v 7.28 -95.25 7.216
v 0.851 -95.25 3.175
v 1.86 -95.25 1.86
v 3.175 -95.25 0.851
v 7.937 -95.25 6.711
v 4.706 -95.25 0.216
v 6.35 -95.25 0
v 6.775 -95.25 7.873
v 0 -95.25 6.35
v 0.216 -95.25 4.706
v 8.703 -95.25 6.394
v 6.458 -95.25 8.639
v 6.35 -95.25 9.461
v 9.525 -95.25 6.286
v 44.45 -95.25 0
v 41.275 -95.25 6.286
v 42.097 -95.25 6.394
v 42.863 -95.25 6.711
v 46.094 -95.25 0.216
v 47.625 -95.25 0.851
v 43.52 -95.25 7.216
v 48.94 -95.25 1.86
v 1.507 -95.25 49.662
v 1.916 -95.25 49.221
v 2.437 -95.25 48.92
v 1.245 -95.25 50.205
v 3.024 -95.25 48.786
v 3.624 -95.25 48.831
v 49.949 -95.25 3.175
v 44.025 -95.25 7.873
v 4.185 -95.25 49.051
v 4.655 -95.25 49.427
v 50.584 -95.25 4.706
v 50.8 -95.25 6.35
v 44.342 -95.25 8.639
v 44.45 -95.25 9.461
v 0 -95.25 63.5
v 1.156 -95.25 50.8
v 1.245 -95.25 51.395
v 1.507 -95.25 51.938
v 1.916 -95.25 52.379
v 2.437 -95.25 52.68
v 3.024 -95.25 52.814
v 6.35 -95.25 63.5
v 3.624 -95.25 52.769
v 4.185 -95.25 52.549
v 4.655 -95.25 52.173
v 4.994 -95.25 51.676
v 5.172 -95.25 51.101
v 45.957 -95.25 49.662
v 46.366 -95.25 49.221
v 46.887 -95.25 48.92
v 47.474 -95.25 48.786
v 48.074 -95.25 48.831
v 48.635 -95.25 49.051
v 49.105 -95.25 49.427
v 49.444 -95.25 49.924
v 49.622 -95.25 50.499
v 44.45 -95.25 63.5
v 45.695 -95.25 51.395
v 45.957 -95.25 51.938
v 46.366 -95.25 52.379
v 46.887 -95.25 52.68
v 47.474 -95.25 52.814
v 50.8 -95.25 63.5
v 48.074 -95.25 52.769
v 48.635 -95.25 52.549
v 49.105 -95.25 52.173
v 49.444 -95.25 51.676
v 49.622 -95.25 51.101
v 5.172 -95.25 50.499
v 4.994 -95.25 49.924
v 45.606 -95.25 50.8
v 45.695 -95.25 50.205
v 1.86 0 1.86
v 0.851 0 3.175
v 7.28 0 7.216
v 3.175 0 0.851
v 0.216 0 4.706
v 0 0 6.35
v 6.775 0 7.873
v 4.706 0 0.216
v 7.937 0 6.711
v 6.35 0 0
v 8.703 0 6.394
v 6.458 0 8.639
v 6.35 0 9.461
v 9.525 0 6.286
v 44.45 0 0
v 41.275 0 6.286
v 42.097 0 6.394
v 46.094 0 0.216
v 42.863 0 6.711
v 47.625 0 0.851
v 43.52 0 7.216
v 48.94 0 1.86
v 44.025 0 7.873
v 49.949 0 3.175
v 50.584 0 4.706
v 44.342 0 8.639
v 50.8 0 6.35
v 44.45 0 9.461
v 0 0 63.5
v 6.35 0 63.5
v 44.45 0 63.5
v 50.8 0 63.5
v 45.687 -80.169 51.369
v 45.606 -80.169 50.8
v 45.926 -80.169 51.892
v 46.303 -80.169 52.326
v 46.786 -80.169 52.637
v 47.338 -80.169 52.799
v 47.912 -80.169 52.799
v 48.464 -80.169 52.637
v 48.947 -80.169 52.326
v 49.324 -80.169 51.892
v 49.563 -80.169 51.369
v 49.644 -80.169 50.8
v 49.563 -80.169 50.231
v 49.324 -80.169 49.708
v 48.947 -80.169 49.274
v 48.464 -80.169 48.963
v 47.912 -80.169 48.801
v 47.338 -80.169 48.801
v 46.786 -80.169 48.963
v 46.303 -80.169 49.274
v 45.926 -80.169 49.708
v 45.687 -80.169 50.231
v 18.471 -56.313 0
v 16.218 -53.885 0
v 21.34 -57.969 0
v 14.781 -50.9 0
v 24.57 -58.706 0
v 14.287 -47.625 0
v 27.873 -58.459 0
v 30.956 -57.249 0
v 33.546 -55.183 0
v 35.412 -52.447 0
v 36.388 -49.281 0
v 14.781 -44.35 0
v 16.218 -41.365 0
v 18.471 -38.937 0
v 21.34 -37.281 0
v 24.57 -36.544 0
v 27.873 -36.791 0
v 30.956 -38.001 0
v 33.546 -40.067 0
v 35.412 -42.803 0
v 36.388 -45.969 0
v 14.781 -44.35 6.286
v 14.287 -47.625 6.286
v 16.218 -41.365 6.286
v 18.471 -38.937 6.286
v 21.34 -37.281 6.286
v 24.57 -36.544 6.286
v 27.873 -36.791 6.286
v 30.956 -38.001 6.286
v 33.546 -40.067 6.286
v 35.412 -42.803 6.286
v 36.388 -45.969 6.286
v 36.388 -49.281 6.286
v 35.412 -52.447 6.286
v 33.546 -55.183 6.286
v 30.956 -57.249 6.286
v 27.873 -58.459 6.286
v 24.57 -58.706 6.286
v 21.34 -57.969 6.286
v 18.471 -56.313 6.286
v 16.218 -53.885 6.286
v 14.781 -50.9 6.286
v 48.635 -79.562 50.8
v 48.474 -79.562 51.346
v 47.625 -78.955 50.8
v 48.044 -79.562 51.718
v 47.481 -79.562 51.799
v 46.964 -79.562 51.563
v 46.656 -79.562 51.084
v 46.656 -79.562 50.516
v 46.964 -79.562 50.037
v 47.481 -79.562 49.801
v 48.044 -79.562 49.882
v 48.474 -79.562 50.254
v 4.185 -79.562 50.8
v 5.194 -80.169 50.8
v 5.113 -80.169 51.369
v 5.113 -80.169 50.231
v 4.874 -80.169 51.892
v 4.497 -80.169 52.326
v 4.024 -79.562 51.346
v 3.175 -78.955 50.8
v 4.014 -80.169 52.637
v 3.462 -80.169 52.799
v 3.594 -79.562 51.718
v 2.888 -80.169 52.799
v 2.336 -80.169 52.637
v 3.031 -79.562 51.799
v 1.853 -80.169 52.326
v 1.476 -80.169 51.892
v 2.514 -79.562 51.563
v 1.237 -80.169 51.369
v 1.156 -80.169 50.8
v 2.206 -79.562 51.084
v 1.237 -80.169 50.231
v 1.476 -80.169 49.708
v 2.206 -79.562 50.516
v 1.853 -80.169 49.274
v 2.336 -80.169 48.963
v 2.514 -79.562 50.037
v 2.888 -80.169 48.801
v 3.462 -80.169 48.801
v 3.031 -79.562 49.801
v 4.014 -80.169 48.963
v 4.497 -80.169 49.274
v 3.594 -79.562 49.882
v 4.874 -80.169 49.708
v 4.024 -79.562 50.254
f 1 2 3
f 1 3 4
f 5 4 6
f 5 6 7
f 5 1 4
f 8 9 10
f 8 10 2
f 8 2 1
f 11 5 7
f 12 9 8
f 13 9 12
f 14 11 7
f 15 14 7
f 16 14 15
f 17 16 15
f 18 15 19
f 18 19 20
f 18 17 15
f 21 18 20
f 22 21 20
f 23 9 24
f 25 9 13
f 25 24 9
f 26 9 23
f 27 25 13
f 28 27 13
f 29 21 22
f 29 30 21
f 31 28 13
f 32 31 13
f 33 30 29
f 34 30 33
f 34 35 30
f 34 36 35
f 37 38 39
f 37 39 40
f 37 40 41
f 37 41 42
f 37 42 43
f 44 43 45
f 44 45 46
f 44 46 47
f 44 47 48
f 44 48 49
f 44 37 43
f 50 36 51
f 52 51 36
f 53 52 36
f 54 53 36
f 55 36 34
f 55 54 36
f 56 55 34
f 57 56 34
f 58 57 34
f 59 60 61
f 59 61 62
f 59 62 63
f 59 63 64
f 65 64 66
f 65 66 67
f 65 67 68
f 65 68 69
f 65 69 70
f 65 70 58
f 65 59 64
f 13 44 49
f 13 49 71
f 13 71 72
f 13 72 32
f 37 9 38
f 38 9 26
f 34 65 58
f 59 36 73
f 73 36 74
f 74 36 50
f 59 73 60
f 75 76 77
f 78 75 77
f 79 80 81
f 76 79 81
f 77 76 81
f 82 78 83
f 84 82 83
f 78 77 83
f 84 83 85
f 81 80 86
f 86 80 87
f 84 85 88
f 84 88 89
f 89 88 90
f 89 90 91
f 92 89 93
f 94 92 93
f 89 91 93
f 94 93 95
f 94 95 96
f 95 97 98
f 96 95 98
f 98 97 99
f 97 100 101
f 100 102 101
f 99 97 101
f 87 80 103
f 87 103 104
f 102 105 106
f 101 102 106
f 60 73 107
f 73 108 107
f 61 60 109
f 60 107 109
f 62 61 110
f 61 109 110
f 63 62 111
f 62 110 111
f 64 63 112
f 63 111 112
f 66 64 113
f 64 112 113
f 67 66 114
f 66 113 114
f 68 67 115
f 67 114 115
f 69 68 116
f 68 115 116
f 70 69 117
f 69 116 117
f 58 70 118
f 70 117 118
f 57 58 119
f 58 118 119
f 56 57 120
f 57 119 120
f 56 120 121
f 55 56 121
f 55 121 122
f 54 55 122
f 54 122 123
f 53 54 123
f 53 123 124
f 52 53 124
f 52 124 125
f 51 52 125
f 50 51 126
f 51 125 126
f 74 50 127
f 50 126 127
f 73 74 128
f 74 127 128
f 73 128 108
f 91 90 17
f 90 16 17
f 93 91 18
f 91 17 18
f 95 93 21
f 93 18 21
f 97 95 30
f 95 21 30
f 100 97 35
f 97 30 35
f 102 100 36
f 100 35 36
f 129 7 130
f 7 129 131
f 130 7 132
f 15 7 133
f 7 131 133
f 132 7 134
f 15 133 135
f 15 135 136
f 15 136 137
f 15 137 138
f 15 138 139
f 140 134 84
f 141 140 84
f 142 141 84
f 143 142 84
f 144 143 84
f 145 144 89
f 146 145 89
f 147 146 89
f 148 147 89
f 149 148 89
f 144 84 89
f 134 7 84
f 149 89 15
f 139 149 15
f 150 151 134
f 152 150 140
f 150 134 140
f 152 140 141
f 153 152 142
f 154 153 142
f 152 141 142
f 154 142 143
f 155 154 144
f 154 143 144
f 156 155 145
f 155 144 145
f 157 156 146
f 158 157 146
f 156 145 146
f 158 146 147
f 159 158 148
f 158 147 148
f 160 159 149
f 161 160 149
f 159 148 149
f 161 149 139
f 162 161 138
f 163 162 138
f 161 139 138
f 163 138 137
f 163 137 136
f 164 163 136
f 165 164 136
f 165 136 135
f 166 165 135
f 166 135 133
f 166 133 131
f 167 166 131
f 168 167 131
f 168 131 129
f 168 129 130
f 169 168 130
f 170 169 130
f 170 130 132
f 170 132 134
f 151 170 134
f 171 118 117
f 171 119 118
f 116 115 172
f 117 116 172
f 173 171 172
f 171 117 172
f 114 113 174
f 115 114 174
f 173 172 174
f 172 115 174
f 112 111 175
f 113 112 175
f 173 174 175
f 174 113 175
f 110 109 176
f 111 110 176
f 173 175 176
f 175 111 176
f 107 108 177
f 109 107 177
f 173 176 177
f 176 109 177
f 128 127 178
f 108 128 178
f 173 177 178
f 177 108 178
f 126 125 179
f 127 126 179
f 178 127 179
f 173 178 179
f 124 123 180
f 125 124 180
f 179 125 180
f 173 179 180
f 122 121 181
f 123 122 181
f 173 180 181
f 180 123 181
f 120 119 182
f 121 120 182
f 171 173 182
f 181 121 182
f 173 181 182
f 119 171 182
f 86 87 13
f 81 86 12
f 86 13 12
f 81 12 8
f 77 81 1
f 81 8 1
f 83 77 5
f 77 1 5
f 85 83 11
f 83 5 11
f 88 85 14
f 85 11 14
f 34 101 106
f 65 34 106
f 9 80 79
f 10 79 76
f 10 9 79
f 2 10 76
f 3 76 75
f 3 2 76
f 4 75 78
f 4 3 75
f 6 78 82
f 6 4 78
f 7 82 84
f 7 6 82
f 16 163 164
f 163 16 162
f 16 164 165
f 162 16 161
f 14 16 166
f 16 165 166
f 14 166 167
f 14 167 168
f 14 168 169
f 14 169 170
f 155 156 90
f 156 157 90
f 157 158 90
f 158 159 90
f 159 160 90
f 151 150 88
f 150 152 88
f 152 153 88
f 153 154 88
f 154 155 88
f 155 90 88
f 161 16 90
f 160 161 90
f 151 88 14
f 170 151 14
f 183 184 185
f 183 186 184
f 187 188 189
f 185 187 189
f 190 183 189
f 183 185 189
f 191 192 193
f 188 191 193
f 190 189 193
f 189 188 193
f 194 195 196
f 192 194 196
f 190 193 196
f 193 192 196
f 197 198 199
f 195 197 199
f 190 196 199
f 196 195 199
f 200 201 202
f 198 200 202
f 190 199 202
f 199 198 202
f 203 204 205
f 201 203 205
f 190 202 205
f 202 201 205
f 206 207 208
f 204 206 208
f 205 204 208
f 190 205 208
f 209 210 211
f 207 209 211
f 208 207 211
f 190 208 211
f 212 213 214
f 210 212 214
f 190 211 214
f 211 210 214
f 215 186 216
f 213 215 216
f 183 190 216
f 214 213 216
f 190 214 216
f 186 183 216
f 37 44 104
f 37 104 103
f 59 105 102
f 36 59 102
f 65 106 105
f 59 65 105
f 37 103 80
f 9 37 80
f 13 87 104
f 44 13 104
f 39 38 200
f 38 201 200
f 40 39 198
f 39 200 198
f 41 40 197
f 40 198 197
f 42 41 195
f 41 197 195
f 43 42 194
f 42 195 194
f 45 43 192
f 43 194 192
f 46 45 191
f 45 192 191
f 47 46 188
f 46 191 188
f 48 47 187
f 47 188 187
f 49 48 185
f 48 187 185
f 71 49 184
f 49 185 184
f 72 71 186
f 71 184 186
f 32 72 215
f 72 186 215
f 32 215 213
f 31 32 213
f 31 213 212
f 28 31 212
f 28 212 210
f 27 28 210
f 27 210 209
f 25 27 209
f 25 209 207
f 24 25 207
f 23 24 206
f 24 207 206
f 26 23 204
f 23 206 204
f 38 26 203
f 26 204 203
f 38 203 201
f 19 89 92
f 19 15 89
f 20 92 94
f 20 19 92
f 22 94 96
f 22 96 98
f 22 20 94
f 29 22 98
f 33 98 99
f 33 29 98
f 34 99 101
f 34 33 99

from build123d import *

# Parameters (mm, degrees)
F1_DEPTH = 95.25
F2_R     = 6.35
F3_R     = 3.175
F5_D     = 4.0386
F5_DEPTH = 15.08125
F5_TIP   = 1.213317848
F7_D     = 22.225


with BuildPart() as f1:
    # F0 (on Front) → F1 (new body)
    with BuildSketch(Plane.XZ):
        Polygon((0, 63.5), (0, 0), (50.8, 0), (50.8, 63.5), (44.45, 63.5), (44.45, 6.2857610174), (6.35, 6.2857610174), (6.35, 63.5), align=None)
    extrude(amount=F1_DEPTH)

    # F2
    f2_edges = [f1.edges().sort_by_distance(p)[0] for p in [
        (50.8, -47.625, 0),
        (0, -47.625, 0),
    ]]
    fillet(f2_edges, radius=F2_R)

    # F3
    f3_edges = [f1.edges().sort_by_distance(p)[0] for p in [
        (44.45, -47.625, 6.285761),
        (6.35, -47.625, 6.285761),
    ]]
    fillet(f3_edges, radius=F3_R)

    # F5
    with Locations(Plane.XZ.offset(95.25)):
        with Locations((3.175, 50.8), (47.625, 50.8)):
            Hole(F5_D / 2, depth=F5_DEPTH)
            with Locations((0, 0, -(F5_DEPTH + F5_TIP / 2))):  # 118° drill point
                Cone(0, F5_D / 2, F5_TIP, mode=Mode.SUBTRACT)

    # F7 (through all)
    with Locations(Plane.XY.offset(6.2857610174)):
        with Locations((25.4, -47.625)):
            Hole(F7_D / 2)


solid = f1.part
